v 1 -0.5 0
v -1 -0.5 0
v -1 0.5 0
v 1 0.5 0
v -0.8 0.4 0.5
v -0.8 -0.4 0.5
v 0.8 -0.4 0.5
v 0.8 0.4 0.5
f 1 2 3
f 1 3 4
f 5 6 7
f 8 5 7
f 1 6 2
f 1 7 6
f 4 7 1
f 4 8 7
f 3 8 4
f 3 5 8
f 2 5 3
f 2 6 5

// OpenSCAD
module ingot(Mat = 0){

    //Color = [Main Body, Pocket] 
    bronze = ["#CD7F32","#7b4c1e"]; 
    silver = ["#c4aead","#cdc9c9"];
    gold = ["#ffd700","#daa520"];

    Material = [bronze,silver,gold];

    color(Material[Mat][0])
    linear_extrude(height = 0.5, scale = 0.8)
    square([2,1], center = true);


}

ingot(Mat = 1);
